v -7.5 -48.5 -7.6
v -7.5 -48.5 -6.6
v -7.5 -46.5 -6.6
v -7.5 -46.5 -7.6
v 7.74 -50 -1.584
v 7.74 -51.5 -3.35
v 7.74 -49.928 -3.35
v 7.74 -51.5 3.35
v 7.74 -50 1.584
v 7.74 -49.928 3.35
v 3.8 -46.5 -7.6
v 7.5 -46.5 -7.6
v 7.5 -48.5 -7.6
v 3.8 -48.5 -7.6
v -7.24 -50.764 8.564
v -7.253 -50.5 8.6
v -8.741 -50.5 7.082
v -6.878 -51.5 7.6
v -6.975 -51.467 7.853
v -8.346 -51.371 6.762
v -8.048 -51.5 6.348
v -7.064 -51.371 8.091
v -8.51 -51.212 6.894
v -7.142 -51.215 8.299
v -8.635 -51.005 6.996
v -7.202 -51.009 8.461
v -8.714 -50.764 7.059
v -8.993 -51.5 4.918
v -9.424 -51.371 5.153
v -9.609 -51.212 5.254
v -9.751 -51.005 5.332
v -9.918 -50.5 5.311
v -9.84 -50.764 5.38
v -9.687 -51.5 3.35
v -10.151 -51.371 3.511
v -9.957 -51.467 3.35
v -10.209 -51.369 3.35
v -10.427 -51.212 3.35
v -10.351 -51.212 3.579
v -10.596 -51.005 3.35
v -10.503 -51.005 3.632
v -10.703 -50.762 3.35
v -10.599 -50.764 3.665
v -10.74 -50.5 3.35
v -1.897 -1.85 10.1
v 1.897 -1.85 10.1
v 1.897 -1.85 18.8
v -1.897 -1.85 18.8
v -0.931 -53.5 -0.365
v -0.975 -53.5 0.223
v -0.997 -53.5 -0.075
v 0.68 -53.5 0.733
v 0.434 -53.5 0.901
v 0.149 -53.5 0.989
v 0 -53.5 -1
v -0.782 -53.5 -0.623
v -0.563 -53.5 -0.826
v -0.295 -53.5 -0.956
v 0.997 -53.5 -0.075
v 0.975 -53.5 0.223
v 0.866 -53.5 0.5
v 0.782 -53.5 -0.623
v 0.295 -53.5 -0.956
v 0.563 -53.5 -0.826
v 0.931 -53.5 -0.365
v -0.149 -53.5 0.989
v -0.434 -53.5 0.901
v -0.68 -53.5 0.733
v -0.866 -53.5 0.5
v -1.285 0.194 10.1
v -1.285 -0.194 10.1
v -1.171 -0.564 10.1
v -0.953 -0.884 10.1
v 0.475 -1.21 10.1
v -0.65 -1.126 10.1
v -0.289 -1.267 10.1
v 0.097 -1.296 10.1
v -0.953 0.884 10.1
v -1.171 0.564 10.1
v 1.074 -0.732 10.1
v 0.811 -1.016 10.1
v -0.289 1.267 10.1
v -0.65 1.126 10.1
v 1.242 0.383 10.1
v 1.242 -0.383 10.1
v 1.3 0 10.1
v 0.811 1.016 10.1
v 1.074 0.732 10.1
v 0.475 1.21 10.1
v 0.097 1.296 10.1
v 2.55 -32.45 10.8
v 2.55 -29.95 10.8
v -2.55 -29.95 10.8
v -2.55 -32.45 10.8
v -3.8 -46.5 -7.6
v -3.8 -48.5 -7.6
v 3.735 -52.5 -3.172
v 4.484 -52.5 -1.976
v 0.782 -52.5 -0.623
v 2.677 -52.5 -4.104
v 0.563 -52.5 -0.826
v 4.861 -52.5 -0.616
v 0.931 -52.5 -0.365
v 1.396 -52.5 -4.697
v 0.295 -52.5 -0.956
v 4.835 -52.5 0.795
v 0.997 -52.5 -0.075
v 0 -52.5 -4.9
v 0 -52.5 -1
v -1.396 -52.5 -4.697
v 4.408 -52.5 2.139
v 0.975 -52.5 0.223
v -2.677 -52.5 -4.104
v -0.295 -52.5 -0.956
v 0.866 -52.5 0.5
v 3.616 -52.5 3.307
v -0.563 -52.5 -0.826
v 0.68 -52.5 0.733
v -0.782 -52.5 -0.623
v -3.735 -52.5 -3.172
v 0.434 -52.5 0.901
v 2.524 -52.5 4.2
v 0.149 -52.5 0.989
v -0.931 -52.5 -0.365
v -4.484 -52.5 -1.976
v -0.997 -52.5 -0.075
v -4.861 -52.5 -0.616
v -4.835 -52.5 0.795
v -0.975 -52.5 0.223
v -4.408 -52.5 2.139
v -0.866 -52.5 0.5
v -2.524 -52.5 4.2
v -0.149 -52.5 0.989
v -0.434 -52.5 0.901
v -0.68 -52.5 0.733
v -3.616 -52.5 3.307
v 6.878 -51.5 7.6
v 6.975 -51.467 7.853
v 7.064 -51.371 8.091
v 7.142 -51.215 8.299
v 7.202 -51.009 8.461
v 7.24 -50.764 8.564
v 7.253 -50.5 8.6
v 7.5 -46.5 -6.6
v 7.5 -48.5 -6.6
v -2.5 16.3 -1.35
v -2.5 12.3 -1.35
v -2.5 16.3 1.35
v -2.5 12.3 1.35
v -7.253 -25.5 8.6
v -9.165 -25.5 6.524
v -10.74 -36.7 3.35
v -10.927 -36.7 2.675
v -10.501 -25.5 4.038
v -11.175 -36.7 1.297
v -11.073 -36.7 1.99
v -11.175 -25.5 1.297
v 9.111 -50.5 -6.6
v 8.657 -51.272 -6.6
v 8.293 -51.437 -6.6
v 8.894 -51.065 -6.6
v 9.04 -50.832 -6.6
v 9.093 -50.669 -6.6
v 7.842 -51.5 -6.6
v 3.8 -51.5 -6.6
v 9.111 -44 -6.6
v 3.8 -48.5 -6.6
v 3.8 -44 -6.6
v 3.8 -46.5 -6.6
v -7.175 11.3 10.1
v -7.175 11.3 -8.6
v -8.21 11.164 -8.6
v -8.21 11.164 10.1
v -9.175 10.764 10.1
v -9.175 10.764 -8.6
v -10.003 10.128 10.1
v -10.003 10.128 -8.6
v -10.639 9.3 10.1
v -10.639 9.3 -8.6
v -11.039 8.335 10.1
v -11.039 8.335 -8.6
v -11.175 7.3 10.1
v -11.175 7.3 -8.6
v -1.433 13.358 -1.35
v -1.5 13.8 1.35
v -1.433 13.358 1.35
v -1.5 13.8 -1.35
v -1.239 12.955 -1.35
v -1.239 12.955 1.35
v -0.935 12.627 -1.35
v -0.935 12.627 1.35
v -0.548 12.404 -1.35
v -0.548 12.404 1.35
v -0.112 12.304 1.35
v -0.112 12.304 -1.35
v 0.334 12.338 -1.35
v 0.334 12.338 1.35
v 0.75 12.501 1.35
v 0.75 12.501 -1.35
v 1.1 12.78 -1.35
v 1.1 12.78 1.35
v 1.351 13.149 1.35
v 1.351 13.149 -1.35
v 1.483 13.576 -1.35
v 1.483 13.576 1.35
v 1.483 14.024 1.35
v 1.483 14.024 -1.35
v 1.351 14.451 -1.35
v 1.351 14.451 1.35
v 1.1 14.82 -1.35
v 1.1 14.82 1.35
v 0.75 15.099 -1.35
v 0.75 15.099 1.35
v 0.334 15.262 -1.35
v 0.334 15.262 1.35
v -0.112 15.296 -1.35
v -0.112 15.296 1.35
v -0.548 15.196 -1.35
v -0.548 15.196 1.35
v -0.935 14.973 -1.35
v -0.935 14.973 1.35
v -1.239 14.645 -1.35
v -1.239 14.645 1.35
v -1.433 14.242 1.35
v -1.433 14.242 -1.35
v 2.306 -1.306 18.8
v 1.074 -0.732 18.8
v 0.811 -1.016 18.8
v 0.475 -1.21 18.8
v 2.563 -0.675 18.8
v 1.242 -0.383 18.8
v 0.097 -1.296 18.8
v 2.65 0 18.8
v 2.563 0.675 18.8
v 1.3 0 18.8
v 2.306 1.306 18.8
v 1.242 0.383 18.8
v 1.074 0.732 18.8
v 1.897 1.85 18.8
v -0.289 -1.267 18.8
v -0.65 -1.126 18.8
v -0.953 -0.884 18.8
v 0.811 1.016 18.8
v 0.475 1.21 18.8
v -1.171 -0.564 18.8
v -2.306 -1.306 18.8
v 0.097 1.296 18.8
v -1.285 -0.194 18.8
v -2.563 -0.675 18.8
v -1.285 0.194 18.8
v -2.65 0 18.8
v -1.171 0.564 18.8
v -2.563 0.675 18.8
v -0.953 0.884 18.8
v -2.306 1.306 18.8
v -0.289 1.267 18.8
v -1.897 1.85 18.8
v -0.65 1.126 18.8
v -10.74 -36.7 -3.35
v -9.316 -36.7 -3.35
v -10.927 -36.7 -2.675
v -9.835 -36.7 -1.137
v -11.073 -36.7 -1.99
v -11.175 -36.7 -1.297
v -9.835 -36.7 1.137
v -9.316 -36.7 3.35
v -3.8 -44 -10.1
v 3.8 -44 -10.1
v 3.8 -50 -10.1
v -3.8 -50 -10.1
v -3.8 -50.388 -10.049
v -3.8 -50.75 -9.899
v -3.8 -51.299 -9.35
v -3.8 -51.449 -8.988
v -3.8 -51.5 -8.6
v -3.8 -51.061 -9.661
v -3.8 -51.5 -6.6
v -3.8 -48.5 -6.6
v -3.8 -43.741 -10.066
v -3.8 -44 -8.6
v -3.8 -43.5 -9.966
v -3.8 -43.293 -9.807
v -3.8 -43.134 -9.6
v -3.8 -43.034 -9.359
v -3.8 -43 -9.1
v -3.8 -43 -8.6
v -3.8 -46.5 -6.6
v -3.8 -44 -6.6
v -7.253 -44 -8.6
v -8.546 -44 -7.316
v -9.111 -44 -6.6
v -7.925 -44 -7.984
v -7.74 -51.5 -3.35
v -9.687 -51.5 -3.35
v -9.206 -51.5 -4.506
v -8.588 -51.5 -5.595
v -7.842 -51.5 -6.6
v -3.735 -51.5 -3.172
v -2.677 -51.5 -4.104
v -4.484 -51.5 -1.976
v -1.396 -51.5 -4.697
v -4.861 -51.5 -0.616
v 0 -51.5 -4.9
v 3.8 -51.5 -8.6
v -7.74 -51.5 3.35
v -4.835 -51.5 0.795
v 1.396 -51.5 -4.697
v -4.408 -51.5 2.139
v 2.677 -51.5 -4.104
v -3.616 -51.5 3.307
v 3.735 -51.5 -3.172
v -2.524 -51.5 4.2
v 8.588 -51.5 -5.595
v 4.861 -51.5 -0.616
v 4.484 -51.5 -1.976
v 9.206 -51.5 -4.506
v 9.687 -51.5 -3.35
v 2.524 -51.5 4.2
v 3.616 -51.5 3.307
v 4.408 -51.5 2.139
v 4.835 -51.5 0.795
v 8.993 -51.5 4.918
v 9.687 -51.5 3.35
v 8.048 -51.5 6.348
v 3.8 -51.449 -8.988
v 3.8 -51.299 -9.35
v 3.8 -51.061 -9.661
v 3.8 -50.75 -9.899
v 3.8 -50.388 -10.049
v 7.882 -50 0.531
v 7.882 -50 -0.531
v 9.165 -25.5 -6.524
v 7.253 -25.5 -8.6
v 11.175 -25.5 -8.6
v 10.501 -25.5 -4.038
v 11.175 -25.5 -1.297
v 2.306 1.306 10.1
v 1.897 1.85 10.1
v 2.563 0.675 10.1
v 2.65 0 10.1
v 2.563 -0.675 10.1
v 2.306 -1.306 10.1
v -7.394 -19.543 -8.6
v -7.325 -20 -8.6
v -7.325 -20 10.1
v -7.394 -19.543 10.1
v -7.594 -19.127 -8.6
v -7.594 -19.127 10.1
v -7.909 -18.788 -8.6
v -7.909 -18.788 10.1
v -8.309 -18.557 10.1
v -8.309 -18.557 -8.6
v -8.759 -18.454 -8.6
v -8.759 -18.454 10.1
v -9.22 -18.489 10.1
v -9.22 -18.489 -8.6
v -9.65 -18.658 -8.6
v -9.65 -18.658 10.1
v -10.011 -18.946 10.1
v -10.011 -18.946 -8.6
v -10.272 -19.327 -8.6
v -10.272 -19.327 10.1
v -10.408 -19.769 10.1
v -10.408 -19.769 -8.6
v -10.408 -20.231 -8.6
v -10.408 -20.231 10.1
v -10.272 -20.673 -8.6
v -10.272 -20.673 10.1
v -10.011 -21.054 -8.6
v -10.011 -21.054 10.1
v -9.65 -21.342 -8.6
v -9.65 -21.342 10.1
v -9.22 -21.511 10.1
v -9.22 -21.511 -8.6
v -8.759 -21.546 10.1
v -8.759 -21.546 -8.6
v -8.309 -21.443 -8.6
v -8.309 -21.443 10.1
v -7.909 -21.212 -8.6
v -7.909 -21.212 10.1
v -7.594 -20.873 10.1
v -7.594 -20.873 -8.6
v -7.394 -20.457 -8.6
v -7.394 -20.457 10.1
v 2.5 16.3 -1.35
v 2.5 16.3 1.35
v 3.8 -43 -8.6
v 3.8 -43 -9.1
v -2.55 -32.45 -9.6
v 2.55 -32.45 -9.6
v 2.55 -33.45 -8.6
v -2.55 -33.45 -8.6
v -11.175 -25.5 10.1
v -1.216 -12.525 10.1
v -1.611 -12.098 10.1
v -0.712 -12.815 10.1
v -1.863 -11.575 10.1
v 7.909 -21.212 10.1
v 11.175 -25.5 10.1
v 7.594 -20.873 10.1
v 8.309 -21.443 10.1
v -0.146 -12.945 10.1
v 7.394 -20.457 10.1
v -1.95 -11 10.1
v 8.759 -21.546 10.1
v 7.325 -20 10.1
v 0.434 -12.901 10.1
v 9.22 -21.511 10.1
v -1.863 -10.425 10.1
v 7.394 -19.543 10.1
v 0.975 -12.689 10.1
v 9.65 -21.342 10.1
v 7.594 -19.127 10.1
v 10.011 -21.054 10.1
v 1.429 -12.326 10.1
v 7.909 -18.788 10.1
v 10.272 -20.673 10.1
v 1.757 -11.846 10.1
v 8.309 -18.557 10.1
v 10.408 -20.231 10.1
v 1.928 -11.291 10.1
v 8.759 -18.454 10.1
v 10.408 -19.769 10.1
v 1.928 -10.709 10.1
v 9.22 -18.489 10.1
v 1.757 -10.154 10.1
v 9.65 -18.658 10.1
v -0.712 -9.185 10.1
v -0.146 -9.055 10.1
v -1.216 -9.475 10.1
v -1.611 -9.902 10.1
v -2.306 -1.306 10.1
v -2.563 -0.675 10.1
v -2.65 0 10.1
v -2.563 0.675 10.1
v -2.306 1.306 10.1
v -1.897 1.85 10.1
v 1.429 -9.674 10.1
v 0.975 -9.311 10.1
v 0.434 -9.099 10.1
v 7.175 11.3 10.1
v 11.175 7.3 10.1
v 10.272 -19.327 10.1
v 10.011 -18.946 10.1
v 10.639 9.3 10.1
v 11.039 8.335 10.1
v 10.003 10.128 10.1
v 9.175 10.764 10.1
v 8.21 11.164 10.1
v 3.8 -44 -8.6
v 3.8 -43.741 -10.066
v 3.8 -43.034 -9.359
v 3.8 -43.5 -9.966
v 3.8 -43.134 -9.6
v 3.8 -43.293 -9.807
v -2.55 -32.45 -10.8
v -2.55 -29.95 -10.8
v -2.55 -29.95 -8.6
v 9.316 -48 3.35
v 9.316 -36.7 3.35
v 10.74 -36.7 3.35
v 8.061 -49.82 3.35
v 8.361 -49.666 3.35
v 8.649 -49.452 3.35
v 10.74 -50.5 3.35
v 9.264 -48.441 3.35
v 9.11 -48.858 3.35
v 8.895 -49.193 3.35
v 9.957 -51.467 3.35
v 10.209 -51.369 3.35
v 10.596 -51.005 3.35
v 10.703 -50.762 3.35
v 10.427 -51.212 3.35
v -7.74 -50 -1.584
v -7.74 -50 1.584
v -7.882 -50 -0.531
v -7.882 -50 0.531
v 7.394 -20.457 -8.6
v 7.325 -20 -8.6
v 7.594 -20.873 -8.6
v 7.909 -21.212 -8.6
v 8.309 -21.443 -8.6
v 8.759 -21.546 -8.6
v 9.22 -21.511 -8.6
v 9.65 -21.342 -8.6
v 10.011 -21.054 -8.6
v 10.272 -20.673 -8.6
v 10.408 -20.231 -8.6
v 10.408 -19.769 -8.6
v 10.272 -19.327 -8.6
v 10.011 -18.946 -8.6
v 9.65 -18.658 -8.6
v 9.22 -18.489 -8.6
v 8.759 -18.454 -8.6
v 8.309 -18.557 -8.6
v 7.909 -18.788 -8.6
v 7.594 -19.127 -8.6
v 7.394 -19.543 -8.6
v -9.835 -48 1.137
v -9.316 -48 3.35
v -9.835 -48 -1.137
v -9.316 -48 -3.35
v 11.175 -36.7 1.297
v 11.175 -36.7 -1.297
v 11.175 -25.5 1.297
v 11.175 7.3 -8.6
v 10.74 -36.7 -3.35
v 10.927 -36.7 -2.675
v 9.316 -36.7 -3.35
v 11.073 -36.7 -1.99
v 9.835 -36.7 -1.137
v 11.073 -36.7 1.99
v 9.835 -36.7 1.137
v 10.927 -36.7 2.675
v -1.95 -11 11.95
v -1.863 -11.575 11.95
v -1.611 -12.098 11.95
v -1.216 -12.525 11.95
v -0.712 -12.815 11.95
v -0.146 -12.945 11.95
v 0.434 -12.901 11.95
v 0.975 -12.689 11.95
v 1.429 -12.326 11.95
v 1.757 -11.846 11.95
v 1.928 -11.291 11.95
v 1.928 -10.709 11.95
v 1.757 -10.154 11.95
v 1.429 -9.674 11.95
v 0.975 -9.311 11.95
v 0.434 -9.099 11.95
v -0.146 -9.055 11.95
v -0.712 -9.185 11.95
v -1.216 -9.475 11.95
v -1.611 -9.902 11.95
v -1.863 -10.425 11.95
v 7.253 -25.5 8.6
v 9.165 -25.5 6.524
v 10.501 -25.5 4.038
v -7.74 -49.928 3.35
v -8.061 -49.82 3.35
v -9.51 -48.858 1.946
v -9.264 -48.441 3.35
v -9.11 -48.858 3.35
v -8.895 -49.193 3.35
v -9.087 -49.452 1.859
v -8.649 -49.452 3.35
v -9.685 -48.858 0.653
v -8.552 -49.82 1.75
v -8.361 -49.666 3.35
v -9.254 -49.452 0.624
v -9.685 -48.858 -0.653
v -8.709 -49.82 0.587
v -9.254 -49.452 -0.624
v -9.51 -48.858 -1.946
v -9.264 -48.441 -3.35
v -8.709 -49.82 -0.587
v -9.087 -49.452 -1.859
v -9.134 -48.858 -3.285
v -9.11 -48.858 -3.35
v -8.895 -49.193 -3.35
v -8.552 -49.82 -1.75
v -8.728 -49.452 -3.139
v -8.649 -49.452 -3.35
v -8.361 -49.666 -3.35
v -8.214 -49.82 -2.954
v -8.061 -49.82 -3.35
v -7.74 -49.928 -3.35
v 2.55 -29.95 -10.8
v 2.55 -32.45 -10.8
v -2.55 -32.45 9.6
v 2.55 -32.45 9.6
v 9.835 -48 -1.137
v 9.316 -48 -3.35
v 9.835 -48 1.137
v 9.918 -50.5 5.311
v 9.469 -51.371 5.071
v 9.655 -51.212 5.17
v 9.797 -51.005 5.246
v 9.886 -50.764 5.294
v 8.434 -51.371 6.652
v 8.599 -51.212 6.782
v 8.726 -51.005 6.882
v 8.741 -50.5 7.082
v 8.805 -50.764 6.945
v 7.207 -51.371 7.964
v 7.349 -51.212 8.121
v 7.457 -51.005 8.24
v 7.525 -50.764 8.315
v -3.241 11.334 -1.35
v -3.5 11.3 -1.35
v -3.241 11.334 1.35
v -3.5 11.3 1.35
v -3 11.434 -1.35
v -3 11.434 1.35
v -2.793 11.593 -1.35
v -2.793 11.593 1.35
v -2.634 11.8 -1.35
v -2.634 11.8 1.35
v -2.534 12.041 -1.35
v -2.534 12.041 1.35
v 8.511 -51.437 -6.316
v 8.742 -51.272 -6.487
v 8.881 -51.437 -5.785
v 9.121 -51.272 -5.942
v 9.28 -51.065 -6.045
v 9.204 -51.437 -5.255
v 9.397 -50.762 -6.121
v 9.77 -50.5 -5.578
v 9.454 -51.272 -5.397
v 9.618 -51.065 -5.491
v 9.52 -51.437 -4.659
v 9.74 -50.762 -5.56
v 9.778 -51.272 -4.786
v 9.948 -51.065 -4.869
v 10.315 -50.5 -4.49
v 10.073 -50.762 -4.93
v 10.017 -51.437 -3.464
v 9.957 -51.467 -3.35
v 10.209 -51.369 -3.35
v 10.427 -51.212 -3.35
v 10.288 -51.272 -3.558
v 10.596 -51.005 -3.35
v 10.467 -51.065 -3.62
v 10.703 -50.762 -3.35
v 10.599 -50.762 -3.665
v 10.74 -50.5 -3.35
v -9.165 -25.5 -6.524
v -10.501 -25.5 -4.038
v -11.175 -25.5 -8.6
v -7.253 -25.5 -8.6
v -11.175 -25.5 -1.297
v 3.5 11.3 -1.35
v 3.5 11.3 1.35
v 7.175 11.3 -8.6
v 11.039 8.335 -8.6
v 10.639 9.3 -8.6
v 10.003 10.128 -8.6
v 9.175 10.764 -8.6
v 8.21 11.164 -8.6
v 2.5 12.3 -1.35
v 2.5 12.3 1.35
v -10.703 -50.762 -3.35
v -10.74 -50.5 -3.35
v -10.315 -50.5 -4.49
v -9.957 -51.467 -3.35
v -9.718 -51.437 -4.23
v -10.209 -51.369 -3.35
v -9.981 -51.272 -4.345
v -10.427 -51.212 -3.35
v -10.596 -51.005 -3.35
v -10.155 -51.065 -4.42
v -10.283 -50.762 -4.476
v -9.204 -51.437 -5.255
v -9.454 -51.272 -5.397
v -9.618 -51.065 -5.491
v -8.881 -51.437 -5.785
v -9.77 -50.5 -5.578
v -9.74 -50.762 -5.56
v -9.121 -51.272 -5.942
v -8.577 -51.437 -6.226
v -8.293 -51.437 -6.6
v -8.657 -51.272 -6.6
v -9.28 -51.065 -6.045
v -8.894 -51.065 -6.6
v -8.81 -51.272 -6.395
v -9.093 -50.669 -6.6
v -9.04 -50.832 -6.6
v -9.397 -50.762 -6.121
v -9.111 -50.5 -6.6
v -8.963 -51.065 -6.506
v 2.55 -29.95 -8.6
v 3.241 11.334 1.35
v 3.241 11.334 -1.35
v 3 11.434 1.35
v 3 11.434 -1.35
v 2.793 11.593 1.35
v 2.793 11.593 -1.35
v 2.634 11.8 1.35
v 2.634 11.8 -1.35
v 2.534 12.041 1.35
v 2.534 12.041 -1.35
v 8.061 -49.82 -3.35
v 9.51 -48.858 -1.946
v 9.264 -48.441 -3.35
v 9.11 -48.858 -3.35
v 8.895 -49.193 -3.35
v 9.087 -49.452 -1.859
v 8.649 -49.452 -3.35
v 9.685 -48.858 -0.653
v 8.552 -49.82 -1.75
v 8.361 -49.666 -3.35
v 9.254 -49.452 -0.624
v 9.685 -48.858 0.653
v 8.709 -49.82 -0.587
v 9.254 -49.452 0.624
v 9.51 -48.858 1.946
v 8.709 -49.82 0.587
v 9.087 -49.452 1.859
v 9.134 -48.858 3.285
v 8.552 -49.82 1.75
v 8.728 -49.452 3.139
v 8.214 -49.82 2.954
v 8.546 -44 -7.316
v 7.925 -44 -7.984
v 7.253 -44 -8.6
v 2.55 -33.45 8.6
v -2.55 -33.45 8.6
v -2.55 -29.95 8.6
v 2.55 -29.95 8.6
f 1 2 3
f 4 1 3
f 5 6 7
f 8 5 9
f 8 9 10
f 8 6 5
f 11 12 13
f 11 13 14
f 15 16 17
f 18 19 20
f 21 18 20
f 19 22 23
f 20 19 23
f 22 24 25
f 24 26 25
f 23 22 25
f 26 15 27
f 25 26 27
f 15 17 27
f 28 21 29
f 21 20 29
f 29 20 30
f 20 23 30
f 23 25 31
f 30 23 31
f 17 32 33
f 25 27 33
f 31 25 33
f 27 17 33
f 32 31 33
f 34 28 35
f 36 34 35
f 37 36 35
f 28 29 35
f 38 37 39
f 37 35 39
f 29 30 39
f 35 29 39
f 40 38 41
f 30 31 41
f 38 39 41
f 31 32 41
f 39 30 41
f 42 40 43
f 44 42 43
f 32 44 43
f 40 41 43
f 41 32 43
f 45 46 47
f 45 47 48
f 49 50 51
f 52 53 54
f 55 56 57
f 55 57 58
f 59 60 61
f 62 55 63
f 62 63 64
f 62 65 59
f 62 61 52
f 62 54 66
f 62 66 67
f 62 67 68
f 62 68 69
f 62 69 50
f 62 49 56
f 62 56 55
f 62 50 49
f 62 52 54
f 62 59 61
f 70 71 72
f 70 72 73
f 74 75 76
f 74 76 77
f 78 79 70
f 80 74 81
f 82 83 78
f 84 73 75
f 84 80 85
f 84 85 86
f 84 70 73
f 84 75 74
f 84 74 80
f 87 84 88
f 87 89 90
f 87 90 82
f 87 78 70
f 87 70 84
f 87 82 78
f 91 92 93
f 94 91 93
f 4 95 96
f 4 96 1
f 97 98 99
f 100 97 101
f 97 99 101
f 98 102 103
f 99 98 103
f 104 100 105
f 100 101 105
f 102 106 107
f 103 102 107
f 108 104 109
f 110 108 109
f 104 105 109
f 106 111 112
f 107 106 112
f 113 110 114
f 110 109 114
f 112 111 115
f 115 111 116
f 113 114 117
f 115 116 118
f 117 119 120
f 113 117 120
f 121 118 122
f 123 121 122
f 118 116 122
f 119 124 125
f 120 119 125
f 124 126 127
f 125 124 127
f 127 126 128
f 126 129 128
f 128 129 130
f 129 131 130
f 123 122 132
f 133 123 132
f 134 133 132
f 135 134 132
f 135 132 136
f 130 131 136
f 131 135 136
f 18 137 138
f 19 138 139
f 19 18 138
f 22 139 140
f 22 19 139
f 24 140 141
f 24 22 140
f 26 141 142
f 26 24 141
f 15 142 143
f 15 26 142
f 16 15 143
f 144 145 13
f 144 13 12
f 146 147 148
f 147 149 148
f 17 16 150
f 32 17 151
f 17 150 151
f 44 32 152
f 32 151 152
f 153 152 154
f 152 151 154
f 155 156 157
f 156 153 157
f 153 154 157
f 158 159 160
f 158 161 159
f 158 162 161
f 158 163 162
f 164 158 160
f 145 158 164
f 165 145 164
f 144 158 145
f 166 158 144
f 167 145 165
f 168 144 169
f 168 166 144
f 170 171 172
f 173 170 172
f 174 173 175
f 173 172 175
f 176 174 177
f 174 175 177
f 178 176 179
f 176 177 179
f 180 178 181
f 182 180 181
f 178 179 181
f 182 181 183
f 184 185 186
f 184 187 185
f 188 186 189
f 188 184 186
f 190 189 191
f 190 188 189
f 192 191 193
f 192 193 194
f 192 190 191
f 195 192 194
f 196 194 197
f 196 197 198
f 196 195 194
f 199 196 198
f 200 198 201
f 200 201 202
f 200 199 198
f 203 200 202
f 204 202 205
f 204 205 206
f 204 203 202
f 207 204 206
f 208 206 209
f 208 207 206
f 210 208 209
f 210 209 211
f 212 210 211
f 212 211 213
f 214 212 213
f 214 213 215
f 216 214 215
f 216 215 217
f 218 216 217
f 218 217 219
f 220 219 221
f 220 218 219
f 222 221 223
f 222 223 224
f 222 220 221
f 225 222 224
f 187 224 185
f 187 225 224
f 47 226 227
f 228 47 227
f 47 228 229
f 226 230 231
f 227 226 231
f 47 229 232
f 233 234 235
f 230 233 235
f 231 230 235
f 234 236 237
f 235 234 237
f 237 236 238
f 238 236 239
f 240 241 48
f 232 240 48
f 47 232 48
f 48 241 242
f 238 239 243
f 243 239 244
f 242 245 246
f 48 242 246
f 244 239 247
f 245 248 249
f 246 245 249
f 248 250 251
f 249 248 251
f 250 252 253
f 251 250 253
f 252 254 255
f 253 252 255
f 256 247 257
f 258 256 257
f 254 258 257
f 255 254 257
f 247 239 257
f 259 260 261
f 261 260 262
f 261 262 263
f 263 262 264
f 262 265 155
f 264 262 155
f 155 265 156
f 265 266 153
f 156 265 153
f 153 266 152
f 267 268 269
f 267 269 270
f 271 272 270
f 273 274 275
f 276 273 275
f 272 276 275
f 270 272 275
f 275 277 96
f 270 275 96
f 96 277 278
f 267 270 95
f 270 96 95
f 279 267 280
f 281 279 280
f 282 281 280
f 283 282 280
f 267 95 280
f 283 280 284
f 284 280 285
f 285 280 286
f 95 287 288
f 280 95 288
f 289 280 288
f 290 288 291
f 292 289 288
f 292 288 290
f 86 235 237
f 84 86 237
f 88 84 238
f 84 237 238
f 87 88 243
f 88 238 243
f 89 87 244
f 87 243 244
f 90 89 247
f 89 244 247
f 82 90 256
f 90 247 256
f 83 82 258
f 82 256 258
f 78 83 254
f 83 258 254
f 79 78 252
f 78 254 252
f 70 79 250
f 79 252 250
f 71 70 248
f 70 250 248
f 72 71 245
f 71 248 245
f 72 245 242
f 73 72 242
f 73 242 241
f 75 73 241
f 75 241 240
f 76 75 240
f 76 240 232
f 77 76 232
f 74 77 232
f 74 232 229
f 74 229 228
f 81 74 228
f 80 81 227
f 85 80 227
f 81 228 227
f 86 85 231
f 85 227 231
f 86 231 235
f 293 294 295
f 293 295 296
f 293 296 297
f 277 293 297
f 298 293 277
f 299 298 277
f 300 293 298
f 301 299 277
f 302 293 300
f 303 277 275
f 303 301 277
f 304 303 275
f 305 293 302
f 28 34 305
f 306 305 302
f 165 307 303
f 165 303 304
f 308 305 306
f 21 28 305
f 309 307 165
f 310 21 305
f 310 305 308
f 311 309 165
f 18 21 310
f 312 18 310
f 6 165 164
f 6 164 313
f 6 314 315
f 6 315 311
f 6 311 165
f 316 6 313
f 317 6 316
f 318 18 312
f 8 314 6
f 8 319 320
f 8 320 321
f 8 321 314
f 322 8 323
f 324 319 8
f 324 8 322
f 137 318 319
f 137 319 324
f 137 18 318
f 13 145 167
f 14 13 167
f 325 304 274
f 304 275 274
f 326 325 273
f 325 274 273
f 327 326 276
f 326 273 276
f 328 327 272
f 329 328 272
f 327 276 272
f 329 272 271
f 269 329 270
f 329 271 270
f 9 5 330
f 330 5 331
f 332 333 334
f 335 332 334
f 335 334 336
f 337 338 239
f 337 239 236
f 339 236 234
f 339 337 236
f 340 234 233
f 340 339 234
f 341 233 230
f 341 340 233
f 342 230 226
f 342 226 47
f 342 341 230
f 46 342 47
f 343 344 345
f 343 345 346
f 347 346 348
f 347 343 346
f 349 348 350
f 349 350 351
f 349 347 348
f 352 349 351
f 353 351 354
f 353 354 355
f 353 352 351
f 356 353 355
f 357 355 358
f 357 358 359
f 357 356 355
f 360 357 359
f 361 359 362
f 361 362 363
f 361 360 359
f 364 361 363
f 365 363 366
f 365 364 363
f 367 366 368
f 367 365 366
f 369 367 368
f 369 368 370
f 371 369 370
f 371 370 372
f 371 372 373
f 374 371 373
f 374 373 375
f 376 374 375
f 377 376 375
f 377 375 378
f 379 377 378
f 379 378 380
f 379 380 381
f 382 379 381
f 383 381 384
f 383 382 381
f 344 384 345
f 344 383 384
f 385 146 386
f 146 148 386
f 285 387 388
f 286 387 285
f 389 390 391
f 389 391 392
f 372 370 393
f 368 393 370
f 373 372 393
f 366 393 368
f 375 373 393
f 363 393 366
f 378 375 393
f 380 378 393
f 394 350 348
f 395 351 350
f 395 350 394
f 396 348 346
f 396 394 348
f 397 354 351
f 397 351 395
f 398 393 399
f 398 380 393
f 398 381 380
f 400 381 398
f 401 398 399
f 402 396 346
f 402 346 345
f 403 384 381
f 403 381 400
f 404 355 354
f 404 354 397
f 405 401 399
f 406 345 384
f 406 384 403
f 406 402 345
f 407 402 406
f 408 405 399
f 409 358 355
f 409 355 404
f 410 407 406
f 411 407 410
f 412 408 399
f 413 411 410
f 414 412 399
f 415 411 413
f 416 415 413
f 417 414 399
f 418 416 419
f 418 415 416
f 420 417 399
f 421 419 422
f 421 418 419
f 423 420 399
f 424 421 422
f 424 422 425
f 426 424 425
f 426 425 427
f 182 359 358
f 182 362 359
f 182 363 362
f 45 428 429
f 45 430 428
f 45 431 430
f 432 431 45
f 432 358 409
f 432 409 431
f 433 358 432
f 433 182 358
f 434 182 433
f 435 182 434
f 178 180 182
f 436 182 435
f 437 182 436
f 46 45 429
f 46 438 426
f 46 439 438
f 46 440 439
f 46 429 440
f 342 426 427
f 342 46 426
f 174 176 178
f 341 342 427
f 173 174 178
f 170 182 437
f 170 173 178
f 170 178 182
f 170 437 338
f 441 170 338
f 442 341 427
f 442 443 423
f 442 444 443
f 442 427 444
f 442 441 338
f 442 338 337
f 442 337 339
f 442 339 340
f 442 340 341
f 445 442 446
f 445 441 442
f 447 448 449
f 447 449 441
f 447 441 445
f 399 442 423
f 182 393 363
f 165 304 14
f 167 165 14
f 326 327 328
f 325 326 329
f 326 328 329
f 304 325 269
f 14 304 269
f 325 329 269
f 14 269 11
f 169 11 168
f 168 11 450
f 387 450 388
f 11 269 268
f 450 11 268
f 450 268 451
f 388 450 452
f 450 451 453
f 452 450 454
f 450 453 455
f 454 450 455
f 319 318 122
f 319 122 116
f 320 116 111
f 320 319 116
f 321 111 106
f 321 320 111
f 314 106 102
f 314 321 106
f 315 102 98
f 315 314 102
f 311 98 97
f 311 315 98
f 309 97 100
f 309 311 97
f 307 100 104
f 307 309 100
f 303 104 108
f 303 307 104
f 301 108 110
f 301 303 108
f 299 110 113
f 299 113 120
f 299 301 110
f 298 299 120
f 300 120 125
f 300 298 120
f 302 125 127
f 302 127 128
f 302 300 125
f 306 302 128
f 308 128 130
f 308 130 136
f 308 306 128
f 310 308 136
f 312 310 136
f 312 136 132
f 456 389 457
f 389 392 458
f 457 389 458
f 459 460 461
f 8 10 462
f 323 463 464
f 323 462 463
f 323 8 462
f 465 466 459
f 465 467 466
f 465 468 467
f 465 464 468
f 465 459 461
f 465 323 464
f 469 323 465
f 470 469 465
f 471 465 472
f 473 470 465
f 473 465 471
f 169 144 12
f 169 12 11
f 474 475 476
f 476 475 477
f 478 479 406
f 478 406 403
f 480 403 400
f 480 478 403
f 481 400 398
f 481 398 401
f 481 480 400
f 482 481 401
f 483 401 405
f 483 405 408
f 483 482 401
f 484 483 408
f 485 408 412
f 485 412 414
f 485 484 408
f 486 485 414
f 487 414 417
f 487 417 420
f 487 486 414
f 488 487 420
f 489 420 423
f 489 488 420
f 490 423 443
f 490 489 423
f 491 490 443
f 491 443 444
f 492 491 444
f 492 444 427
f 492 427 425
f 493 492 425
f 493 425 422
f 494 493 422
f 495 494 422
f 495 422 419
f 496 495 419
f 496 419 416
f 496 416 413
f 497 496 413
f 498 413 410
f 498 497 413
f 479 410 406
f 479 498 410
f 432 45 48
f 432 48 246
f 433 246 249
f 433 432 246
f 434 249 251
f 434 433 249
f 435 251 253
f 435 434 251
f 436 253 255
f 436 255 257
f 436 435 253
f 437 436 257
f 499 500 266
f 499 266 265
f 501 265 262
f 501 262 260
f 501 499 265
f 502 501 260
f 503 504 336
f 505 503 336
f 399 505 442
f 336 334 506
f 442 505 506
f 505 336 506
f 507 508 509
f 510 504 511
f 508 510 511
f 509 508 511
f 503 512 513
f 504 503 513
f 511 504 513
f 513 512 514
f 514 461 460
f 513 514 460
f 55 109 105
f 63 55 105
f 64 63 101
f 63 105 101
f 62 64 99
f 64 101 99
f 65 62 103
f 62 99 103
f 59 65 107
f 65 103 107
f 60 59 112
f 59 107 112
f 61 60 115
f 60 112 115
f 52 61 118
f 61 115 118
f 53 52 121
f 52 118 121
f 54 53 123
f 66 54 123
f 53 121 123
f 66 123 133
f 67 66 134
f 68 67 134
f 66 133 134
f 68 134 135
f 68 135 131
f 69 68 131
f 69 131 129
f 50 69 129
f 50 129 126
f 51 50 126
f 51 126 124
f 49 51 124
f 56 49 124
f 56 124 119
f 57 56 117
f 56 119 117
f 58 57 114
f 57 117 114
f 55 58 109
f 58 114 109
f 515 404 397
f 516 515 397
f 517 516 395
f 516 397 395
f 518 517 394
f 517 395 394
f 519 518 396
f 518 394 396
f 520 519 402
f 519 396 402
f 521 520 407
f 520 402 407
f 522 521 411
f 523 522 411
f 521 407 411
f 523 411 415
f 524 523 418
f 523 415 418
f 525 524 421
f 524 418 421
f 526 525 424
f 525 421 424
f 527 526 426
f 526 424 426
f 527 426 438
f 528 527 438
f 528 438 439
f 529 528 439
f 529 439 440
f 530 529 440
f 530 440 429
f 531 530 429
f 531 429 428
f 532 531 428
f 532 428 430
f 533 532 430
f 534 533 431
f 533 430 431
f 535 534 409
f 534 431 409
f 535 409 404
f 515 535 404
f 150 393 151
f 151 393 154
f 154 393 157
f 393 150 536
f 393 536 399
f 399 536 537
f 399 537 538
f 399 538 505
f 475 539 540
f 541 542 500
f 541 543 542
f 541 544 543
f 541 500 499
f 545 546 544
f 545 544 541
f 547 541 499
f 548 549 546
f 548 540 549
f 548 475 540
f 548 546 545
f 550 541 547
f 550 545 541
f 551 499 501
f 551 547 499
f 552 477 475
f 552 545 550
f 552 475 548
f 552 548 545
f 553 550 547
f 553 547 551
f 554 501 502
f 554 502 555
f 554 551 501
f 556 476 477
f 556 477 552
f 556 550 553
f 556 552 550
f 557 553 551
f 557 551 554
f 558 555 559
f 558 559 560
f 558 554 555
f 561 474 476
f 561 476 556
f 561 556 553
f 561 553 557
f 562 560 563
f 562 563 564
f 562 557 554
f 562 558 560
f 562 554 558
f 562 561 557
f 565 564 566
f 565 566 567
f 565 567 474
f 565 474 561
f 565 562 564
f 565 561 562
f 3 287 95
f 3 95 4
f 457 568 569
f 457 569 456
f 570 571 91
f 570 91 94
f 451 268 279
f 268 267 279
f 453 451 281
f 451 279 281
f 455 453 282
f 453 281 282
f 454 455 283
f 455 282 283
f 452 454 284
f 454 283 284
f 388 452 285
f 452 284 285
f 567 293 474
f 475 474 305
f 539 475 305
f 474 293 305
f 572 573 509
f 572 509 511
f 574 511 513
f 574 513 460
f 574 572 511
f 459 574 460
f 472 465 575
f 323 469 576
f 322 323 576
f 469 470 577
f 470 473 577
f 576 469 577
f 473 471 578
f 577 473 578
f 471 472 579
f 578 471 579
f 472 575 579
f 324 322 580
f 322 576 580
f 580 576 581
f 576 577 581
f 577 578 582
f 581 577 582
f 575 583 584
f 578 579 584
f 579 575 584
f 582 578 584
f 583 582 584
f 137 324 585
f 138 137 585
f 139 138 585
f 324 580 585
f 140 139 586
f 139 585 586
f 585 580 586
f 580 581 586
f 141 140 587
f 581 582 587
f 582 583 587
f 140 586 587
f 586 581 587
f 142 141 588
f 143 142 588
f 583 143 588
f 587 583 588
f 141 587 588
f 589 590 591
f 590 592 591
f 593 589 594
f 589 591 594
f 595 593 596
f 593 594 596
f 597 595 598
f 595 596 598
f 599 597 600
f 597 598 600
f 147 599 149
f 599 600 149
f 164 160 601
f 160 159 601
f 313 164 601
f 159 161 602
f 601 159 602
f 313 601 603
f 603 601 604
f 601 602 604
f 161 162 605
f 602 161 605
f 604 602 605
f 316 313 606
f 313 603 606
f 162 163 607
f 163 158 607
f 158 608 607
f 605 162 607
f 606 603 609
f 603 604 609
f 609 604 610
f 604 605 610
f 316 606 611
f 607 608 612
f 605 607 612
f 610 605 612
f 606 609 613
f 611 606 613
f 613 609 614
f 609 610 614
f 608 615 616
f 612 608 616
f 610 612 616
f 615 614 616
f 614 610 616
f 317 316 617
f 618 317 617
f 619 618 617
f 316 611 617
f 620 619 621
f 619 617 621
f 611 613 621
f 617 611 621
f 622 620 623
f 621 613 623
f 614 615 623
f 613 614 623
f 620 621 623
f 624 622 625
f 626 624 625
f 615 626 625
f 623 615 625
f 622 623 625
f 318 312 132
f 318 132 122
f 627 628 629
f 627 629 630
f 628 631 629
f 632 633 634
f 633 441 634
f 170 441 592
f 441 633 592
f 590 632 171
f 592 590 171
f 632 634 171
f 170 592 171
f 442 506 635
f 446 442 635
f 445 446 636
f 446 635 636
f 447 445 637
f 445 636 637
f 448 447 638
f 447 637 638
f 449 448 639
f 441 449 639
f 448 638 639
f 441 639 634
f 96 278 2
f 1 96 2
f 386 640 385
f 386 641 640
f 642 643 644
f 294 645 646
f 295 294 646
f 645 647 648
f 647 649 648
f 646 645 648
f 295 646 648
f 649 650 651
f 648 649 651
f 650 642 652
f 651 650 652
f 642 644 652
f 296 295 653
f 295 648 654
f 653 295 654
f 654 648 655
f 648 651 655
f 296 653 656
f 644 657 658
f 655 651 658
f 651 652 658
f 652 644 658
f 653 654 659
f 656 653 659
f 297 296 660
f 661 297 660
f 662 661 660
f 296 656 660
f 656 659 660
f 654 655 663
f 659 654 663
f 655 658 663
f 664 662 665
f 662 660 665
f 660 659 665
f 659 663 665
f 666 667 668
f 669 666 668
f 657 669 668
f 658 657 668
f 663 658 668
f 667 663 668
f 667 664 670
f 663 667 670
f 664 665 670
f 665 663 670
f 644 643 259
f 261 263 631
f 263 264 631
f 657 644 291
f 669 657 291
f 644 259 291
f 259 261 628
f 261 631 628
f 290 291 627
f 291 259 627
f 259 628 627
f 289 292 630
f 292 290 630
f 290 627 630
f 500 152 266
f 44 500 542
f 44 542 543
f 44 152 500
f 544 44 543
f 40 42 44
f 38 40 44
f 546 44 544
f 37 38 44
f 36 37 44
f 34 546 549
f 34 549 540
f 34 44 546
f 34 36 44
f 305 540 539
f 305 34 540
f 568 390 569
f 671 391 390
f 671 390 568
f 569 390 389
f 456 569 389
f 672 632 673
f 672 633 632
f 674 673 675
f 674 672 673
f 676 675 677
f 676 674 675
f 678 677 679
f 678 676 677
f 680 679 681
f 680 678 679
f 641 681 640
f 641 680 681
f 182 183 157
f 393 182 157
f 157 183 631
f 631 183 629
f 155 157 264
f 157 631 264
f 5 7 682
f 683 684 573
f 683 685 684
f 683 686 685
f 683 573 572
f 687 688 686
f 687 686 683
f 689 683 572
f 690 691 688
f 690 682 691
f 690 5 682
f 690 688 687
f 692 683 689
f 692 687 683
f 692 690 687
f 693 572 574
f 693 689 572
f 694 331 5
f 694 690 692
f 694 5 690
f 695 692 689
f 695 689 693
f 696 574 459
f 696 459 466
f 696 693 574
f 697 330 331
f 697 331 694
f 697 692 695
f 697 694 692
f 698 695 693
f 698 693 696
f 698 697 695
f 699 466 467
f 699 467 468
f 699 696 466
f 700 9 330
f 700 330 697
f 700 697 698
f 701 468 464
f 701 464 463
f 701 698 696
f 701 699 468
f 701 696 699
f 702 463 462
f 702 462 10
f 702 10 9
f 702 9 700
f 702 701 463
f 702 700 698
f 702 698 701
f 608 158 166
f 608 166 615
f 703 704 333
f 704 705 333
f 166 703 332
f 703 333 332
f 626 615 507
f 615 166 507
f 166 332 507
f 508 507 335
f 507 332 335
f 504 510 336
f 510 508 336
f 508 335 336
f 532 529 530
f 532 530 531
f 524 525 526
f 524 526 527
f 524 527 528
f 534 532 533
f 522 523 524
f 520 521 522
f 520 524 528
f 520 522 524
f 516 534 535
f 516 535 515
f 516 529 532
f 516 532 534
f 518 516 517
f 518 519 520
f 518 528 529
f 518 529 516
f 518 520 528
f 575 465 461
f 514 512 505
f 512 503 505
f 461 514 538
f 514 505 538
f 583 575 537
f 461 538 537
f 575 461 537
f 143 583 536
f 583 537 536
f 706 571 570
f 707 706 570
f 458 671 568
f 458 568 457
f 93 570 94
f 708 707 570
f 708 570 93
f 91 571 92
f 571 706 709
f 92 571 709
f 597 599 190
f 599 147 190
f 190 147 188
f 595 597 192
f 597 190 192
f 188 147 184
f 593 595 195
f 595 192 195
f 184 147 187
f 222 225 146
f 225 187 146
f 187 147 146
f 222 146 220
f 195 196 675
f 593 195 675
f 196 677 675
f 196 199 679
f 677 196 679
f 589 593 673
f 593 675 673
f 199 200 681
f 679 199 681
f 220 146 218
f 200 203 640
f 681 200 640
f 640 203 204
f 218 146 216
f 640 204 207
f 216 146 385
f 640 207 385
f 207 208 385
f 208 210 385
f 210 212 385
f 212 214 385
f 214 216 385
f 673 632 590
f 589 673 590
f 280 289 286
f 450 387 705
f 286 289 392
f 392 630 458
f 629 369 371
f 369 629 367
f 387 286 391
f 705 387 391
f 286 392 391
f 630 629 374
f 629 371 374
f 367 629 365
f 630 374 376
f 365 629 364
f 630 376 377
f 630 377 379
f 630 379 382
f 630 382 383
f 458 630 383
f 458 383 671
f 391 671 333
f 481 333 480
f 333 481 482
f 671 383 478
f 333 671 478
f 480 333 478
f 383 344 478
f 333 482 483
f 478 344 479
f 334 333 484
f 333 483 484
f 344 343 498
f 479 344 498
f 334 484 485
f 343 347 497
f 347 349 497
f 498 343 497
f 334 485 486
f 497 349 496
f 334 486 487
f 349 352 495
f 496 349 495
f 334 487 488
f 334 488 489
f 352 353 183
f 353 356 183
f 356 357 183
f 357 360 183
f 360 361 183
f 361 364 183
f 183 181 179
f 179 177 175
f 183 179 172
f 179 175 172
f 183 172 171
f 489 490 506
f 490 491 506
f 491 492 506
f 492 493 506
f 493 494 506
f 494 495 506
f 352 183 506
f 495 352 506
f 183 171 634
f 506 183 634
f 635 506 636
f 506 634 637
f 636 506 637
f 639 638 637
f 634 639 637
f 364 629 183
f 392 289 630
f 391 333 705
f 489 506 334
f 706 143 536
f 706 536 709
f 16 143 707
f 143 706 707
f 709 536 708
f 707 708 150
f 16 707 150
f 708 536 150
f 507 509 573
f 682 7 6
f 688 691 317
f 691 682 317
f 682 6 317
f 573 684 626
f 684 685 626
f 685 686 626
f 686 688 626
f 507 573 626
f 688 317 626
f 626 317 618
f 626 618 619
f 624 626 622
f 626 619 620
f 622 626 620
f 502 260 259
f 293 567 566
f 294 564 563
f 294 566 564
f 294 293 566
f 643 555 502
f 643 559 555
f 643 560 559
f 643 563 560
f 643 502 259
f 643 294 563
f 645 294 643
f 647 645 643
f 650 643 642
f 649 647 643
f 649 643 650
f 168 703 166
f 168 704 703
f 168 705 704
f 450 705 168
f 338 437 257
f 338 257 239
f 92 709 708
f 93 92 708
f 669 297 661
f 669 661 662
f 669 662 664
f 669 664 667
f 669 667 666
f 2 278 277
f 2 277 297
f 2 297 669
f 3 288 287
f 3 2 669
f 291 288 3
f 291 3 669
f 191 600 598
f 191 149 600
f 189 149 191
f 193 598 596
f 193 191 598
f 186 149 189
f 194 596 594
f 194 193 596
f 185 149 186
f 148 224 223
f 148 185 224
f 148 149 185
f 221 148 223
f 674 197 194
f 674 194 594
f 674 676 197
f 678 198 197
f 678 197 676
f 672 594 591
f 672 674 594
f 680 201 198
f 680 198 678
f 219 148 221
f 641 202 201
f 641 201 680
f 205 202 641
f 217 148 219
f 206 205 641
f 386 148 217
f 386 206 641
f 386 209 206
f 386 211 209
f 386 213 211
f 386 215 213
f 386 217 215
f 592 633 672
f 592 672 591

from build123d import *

# Parameters (mm, degrees)
BOSS_EXTRUDE1_DEPTH      = 10.1
BOSS_EXTRUDE1_DEPTH_BACK = 8.6
SKETCH1_R                = 1.55
BOSS_EXTRUDE2_DEPTH      = 8.7
SKETCH3_R                = 1.95
BOSS_EXTRUDE3_DEPTH      = 1.85
BOSS_EXTRUDE4_DEPTH      = 26
SKETCH5_W                = 5.1
SKETCH5_H                = 2.5
BOSS_EXTRUDE5_DEPTH      = 2.2
CHAMFER1_SIZE            = 1
CUT_EXTRUDE1_DEPTH       = 14.8
SKETCH7_W                = 3
SKETCH7_H                = 6.7
CUT_EXTRUDE2_DEPTH       = 1.5
FILLET1_R                = 2
SKETCH8_W                = 7.6
SKETCH8_H                = 8.5
BOSS_EXTRUDE6_DEPTH      = 1.5
SKETCH9_W                = 6.939646177
SKETCH9_H                = 7.5
CUT_EXTRUDE3_DEPTH       = 2
SKETCH10_W               = 3.7
SKETCH10_H               = 2
BOSS_EXTRUDE7_DEPTH      = 1
FILLET2_R                = 1.5
BOSS_EXTRUDE8_DEPTH      = 1
SKETCH12_R               = 1
BOSS_EXTRUDE9_DEPTH      = 1
SKETCH13_R               = 1.3
CUT_EXTRUDE4_DEPTH       = 8.7
SKETCH14_W               = 5
SKETCH14_H               = 5
SKETCH14_R               = 1.5
BOSS_EXTRUDE10_DEPTH     = 1.35
FILLET3_R                = 1


with BuildPart() as part:
    # Sketch1 → Boss-Extrude1 (new, two sides: drawn at the far end of the back side and taken through both)
    with BuildSketch(Plane.XY.offset(-BOSS_EXTRUDE1_DEPTH_BACK)):
        with BuildLine():
            Line((-11.175, -25.5), (11.175, -25.5))
            Line((11.175, -25.5), (11.175, 7.3))
            ThreePointArc((11.175, 7.3), (10.003427125, 10.128427125), (7.175, 11.3))
            Line((7.175, 11.3), (-7.175, 11.3))
            ThreePointArc((-7.175, 11.3), (-10.003427125, 10.128427125), (-11.175, 7.3))
            Line((-11.175, 7.3), (-11.175, -25.5))
        make_face()
        with Locations((-8.875, -20)):
            Circle(SKETCH1_R, mode=Mode.SUBTRACT)
        with Locations(Location((8.875, -20, 0), (0, 0, 180))):
            Circle(SKETCH1_R, mode=Mode.SUBTRACT)
    extrude(amount=BOSS_EXTRUDE1_DEPTH + BOSS_EXTRUDE1_DEPTH_BACK)

    # Sketch2 → Boss-Extrude2 (add)
    with BuildSketch(Plane.XY.offset(10.1)):
        with BuildLine():
            Line((-1.897366596, 1.85), (1.897366596, 1.85))
            ThreePointArc((1.897366596, 1.85), (2.65, 0), (1.897366596, -1.85))
            Line((1.897366596, -1.85), (-1.897366596, -1.85))
            ThreePointArc((-1.897366596, -1.85), (-2.65, 0), (-1.897366596, 1.85))
        make_face()
    extrude(amount=BOSS_EXTRUDE2_DEPTH)

    # Sketch3 → Boss-Extrude3 (add)
    with BuildSketch(Plane.XY.offset(10.1)):
        with Locations(Location((0, -11, 0), (0, 0, 180))):
            Circle(SKETCH3_R)
    extrude(amount=BOSS_EXTRUDE3_DEPTH)

    # Sketch4 → Boss-Extrude4 (add)
    with BuildSketch(Plane.XZ.offset(25.5)):
        with BuildLine():
            Line((-7.252758096, -8.6), (7.252758096, -8.6))
            ThreePointArc((7.252758096, -8.6), (9.911079132, -5.322876144), (11.175, -1.296871235))
            Line((11.175, -1.296871235), (11.175, 1.296871235))
            ThreePointArc((11.175, 1.296871235), (9.911079132, 5.322876144), (7.252758096, 8.6))
            Line((7.252758096, 8.6), (-7.252758096, 8.6))
            ThreePointArc((-7.252758096, 8.6), (-9.911079132, 5.322876144), (-11.175, 1.296871235))
            Line((-11.175, 1.296871235), (-11.175, -1.296871235))
            ThreePointArc((-11.175, -1.296871235), (-9.911079132, -5.322876144), (-7.252758096, -8.6))
        make_face()
    extrude(amount=BOSS_EXTRUDE4_DEPTH)

    # Sketch5 → Boss-Extrude5 (add)
    with BuildSketch(Plane(origin=(0, 0, -8.6), x_dir=(-1, 0, 0), z_dir=(0, 0, -1))):
        with Locations((0, -31.2)):
            Rectangle(SKETCH5_W, SKETCH5_H)
    boss_extrude5 = extrude(amount=BOSS_EXTRUDE5_DEPTH)

    # Mirror1: Boss-Extrude5 across plane
    add(boss_extrude5.mirror(Plane.XY))

    # Chamfer1
    chamfer1_edges = [part.edges().sort_by_distance(p)[0] for p in [
        (0, -32.45, 8.6),
        (0, -32.45, -8.6),
    ]]
    chamfer(chamfer1_edges, length=CHAMFER1_SIZE)

    # Sketch6 → Cut-Extrude1 (cut)
    with BuildSketch(Plane.XZ.offset(51.5)):
        with BuildLine():
            Line((-11.175, 3.35), (-9.315980893, 3.35))
            ThreePointArc((-9.315980893, 3.35), (-9.9, 0), (-9.315980893, -3.35))
            Line((-9.315980893, -3.35), (-11.175, -3.35))
            Line((-11.175, -3.35), (-11.175, 3.35))
        make_face()
        with BuildLine():
            Line((11.175, -3.35), (9.315980893, -3.35))
            ThreePointArc((9.315980893, -3.35), (9.9, 0), (9.315980893, 3.35))
            Line((9.315980893, 3.35), (11.175, 3.35))
            Line((11.175, 3.35), (11.175, -3.35))
        make_face()
    extrude(amount=-CUT_EXTRUDE1_DEPTH, mode=Mode.SUBTRACT)

    # Sketch7 → Cut-Extrude2 (cut)
    with BuildSketch(Plane.XZ.offset(51.5)):
        with Locations((-9.239646177, 0)):
            Rectangle(SKETCH7_W, SKETCH7_H)
        with Locations((9.239646177, 0)):
            Rectangle(SKETCH7_W, SKETCH7_H)
    extrude(amount=-CUT_EXTRUDE2_DEPTH, mode=Mode.SUBTRACT)

    # Fillet1
    fillet1_edges = [part.edges().sort_by_distance(p)[0] for p in [
        (9.9, -50, 0),
        (-9.9, -50, 0),
    ]]
    fillet(fillet1_edges, radius=FILLET1_R)

    # Sketch8 → Boss-Extrude6 (add)
    with BuildSketch(Plane(origin=(0, 0, -8.6), x_dir=(-1, 0, 0), z_dir=(0, 0, -1))):
        with Locations((0, -47.25)):
            Rectangle(SKETCH8_W, SKETCH8_H)
    extrude(amount=BOSS_EXTRUDE6_DEPTH)

    # Sketch9 → Cut-Extrude3 (cut)
    with BuildSketch(Plane(origin=(0, 0, -8.6), x_dir=(-1, 0, 0), z_dir=(0, 0, -1))):
        with Locations((7.269823089, -47.75)):
            Rectangle(SKETCH9_W, SKETCH9_H)
        with Locations((-7.269823089, -47.75)):
            Rectangle(SKETCH9_W, SKETCH9_H)
    extrude(amount=-CUT_EXTRUDE3_DEPTH, mode=Mode.SUBTRACT)

    # Sketch10 → Boss-Extrude7 (add)
    with BuildSketch(Plane(origin=(0, 0, -6.6), x_dir=(-1, 0, 0), z_dir=(0, 0, -1))):
        with Locations((-5.65, -47.5)):
            Rectangle(SKETCH10_W, SKETCH10_H)
        with Locations((5.65, -47.5)):
            Rectangle(SKETCH10_W, SKETCH10_H)
    extrude(amount=BOSS_EXTRUDE7_DEPTH)

    # Fillet2
    fillet2_edges = [part.edges().sort_by_distance(p)[0] for p in [
        (0, -51.5, -10.1),
    ]]
    fillet(fillet2_edges, radius=FILLET2_R)

    # Sketch11 → Boss-Extrude8 (add)
    with BuildSketch(Plane.XZ.offset(51.5)):
        with BuildLine():
            Line((-2.523885893, 4.2), (2.523885893, 4.2))
            ThreePointArc((2.523885893, 4.2), (0, -4.9), (-2.523885893, 4.2))
        make_face()
    extrude(amount=BOSS_EXTRUDE8_DEPTH)

    # Sketch12 → Boss-Extrude9 (add)
    with BuildSketch(Plane.XZ.offset(52.5)):
        with Locations(Location((0, 0, 0), (0, 0, 270))):
            Circle(SKETCH12_R)
    extrude(amount=BOSS_EXTRUDE9_DEPTH)

    # Sketch13 → Cut-Extrude4 (cut)
    with BuildSketch(Plane.XY.offset(18.8)):
        Circle(SKETCH13_R)
    extrude(amount=-CUT_EXTRUDE4_DEPTH, mode=Mode.SUBTRACT)

    # Sketch14 → Boss-Extrude10 (add, symmetric)
    with BuildSketch(Plane.XY):
        with Locations((0, 13.8)):
            Rectangle(SKETCH14_W, SKETCH14_H)
        with Locations(Location((0, 13.8, 0), (0, 0, 180))):
            Circle(SKETCH14_R, mode=Mode.SUBTRACT)
    extrude(amount=BOSS_EXTRUDE10_DEPTH, both=True)

    # Fillet3
    fillet3_edges = [part.edges().sort_by_distance(p)[0] for p in [
        (9.371354111, -51.5, 6.224164371),
        (-10.057256253, -51.5, -5.041239595),
        (0, -43, -10.1),
        (10.057256253, -51.5, -5.041239595),
        (2.5, 11.3, 0),
        (-2.5, 11.3, 0),
        (0, -51.5, 8.6),
        (-9.371354111, -51.5, 6.224164371),
    ]]
    fillet(fillet3_edges, radius=FILLET3_R)


solid = part.part
